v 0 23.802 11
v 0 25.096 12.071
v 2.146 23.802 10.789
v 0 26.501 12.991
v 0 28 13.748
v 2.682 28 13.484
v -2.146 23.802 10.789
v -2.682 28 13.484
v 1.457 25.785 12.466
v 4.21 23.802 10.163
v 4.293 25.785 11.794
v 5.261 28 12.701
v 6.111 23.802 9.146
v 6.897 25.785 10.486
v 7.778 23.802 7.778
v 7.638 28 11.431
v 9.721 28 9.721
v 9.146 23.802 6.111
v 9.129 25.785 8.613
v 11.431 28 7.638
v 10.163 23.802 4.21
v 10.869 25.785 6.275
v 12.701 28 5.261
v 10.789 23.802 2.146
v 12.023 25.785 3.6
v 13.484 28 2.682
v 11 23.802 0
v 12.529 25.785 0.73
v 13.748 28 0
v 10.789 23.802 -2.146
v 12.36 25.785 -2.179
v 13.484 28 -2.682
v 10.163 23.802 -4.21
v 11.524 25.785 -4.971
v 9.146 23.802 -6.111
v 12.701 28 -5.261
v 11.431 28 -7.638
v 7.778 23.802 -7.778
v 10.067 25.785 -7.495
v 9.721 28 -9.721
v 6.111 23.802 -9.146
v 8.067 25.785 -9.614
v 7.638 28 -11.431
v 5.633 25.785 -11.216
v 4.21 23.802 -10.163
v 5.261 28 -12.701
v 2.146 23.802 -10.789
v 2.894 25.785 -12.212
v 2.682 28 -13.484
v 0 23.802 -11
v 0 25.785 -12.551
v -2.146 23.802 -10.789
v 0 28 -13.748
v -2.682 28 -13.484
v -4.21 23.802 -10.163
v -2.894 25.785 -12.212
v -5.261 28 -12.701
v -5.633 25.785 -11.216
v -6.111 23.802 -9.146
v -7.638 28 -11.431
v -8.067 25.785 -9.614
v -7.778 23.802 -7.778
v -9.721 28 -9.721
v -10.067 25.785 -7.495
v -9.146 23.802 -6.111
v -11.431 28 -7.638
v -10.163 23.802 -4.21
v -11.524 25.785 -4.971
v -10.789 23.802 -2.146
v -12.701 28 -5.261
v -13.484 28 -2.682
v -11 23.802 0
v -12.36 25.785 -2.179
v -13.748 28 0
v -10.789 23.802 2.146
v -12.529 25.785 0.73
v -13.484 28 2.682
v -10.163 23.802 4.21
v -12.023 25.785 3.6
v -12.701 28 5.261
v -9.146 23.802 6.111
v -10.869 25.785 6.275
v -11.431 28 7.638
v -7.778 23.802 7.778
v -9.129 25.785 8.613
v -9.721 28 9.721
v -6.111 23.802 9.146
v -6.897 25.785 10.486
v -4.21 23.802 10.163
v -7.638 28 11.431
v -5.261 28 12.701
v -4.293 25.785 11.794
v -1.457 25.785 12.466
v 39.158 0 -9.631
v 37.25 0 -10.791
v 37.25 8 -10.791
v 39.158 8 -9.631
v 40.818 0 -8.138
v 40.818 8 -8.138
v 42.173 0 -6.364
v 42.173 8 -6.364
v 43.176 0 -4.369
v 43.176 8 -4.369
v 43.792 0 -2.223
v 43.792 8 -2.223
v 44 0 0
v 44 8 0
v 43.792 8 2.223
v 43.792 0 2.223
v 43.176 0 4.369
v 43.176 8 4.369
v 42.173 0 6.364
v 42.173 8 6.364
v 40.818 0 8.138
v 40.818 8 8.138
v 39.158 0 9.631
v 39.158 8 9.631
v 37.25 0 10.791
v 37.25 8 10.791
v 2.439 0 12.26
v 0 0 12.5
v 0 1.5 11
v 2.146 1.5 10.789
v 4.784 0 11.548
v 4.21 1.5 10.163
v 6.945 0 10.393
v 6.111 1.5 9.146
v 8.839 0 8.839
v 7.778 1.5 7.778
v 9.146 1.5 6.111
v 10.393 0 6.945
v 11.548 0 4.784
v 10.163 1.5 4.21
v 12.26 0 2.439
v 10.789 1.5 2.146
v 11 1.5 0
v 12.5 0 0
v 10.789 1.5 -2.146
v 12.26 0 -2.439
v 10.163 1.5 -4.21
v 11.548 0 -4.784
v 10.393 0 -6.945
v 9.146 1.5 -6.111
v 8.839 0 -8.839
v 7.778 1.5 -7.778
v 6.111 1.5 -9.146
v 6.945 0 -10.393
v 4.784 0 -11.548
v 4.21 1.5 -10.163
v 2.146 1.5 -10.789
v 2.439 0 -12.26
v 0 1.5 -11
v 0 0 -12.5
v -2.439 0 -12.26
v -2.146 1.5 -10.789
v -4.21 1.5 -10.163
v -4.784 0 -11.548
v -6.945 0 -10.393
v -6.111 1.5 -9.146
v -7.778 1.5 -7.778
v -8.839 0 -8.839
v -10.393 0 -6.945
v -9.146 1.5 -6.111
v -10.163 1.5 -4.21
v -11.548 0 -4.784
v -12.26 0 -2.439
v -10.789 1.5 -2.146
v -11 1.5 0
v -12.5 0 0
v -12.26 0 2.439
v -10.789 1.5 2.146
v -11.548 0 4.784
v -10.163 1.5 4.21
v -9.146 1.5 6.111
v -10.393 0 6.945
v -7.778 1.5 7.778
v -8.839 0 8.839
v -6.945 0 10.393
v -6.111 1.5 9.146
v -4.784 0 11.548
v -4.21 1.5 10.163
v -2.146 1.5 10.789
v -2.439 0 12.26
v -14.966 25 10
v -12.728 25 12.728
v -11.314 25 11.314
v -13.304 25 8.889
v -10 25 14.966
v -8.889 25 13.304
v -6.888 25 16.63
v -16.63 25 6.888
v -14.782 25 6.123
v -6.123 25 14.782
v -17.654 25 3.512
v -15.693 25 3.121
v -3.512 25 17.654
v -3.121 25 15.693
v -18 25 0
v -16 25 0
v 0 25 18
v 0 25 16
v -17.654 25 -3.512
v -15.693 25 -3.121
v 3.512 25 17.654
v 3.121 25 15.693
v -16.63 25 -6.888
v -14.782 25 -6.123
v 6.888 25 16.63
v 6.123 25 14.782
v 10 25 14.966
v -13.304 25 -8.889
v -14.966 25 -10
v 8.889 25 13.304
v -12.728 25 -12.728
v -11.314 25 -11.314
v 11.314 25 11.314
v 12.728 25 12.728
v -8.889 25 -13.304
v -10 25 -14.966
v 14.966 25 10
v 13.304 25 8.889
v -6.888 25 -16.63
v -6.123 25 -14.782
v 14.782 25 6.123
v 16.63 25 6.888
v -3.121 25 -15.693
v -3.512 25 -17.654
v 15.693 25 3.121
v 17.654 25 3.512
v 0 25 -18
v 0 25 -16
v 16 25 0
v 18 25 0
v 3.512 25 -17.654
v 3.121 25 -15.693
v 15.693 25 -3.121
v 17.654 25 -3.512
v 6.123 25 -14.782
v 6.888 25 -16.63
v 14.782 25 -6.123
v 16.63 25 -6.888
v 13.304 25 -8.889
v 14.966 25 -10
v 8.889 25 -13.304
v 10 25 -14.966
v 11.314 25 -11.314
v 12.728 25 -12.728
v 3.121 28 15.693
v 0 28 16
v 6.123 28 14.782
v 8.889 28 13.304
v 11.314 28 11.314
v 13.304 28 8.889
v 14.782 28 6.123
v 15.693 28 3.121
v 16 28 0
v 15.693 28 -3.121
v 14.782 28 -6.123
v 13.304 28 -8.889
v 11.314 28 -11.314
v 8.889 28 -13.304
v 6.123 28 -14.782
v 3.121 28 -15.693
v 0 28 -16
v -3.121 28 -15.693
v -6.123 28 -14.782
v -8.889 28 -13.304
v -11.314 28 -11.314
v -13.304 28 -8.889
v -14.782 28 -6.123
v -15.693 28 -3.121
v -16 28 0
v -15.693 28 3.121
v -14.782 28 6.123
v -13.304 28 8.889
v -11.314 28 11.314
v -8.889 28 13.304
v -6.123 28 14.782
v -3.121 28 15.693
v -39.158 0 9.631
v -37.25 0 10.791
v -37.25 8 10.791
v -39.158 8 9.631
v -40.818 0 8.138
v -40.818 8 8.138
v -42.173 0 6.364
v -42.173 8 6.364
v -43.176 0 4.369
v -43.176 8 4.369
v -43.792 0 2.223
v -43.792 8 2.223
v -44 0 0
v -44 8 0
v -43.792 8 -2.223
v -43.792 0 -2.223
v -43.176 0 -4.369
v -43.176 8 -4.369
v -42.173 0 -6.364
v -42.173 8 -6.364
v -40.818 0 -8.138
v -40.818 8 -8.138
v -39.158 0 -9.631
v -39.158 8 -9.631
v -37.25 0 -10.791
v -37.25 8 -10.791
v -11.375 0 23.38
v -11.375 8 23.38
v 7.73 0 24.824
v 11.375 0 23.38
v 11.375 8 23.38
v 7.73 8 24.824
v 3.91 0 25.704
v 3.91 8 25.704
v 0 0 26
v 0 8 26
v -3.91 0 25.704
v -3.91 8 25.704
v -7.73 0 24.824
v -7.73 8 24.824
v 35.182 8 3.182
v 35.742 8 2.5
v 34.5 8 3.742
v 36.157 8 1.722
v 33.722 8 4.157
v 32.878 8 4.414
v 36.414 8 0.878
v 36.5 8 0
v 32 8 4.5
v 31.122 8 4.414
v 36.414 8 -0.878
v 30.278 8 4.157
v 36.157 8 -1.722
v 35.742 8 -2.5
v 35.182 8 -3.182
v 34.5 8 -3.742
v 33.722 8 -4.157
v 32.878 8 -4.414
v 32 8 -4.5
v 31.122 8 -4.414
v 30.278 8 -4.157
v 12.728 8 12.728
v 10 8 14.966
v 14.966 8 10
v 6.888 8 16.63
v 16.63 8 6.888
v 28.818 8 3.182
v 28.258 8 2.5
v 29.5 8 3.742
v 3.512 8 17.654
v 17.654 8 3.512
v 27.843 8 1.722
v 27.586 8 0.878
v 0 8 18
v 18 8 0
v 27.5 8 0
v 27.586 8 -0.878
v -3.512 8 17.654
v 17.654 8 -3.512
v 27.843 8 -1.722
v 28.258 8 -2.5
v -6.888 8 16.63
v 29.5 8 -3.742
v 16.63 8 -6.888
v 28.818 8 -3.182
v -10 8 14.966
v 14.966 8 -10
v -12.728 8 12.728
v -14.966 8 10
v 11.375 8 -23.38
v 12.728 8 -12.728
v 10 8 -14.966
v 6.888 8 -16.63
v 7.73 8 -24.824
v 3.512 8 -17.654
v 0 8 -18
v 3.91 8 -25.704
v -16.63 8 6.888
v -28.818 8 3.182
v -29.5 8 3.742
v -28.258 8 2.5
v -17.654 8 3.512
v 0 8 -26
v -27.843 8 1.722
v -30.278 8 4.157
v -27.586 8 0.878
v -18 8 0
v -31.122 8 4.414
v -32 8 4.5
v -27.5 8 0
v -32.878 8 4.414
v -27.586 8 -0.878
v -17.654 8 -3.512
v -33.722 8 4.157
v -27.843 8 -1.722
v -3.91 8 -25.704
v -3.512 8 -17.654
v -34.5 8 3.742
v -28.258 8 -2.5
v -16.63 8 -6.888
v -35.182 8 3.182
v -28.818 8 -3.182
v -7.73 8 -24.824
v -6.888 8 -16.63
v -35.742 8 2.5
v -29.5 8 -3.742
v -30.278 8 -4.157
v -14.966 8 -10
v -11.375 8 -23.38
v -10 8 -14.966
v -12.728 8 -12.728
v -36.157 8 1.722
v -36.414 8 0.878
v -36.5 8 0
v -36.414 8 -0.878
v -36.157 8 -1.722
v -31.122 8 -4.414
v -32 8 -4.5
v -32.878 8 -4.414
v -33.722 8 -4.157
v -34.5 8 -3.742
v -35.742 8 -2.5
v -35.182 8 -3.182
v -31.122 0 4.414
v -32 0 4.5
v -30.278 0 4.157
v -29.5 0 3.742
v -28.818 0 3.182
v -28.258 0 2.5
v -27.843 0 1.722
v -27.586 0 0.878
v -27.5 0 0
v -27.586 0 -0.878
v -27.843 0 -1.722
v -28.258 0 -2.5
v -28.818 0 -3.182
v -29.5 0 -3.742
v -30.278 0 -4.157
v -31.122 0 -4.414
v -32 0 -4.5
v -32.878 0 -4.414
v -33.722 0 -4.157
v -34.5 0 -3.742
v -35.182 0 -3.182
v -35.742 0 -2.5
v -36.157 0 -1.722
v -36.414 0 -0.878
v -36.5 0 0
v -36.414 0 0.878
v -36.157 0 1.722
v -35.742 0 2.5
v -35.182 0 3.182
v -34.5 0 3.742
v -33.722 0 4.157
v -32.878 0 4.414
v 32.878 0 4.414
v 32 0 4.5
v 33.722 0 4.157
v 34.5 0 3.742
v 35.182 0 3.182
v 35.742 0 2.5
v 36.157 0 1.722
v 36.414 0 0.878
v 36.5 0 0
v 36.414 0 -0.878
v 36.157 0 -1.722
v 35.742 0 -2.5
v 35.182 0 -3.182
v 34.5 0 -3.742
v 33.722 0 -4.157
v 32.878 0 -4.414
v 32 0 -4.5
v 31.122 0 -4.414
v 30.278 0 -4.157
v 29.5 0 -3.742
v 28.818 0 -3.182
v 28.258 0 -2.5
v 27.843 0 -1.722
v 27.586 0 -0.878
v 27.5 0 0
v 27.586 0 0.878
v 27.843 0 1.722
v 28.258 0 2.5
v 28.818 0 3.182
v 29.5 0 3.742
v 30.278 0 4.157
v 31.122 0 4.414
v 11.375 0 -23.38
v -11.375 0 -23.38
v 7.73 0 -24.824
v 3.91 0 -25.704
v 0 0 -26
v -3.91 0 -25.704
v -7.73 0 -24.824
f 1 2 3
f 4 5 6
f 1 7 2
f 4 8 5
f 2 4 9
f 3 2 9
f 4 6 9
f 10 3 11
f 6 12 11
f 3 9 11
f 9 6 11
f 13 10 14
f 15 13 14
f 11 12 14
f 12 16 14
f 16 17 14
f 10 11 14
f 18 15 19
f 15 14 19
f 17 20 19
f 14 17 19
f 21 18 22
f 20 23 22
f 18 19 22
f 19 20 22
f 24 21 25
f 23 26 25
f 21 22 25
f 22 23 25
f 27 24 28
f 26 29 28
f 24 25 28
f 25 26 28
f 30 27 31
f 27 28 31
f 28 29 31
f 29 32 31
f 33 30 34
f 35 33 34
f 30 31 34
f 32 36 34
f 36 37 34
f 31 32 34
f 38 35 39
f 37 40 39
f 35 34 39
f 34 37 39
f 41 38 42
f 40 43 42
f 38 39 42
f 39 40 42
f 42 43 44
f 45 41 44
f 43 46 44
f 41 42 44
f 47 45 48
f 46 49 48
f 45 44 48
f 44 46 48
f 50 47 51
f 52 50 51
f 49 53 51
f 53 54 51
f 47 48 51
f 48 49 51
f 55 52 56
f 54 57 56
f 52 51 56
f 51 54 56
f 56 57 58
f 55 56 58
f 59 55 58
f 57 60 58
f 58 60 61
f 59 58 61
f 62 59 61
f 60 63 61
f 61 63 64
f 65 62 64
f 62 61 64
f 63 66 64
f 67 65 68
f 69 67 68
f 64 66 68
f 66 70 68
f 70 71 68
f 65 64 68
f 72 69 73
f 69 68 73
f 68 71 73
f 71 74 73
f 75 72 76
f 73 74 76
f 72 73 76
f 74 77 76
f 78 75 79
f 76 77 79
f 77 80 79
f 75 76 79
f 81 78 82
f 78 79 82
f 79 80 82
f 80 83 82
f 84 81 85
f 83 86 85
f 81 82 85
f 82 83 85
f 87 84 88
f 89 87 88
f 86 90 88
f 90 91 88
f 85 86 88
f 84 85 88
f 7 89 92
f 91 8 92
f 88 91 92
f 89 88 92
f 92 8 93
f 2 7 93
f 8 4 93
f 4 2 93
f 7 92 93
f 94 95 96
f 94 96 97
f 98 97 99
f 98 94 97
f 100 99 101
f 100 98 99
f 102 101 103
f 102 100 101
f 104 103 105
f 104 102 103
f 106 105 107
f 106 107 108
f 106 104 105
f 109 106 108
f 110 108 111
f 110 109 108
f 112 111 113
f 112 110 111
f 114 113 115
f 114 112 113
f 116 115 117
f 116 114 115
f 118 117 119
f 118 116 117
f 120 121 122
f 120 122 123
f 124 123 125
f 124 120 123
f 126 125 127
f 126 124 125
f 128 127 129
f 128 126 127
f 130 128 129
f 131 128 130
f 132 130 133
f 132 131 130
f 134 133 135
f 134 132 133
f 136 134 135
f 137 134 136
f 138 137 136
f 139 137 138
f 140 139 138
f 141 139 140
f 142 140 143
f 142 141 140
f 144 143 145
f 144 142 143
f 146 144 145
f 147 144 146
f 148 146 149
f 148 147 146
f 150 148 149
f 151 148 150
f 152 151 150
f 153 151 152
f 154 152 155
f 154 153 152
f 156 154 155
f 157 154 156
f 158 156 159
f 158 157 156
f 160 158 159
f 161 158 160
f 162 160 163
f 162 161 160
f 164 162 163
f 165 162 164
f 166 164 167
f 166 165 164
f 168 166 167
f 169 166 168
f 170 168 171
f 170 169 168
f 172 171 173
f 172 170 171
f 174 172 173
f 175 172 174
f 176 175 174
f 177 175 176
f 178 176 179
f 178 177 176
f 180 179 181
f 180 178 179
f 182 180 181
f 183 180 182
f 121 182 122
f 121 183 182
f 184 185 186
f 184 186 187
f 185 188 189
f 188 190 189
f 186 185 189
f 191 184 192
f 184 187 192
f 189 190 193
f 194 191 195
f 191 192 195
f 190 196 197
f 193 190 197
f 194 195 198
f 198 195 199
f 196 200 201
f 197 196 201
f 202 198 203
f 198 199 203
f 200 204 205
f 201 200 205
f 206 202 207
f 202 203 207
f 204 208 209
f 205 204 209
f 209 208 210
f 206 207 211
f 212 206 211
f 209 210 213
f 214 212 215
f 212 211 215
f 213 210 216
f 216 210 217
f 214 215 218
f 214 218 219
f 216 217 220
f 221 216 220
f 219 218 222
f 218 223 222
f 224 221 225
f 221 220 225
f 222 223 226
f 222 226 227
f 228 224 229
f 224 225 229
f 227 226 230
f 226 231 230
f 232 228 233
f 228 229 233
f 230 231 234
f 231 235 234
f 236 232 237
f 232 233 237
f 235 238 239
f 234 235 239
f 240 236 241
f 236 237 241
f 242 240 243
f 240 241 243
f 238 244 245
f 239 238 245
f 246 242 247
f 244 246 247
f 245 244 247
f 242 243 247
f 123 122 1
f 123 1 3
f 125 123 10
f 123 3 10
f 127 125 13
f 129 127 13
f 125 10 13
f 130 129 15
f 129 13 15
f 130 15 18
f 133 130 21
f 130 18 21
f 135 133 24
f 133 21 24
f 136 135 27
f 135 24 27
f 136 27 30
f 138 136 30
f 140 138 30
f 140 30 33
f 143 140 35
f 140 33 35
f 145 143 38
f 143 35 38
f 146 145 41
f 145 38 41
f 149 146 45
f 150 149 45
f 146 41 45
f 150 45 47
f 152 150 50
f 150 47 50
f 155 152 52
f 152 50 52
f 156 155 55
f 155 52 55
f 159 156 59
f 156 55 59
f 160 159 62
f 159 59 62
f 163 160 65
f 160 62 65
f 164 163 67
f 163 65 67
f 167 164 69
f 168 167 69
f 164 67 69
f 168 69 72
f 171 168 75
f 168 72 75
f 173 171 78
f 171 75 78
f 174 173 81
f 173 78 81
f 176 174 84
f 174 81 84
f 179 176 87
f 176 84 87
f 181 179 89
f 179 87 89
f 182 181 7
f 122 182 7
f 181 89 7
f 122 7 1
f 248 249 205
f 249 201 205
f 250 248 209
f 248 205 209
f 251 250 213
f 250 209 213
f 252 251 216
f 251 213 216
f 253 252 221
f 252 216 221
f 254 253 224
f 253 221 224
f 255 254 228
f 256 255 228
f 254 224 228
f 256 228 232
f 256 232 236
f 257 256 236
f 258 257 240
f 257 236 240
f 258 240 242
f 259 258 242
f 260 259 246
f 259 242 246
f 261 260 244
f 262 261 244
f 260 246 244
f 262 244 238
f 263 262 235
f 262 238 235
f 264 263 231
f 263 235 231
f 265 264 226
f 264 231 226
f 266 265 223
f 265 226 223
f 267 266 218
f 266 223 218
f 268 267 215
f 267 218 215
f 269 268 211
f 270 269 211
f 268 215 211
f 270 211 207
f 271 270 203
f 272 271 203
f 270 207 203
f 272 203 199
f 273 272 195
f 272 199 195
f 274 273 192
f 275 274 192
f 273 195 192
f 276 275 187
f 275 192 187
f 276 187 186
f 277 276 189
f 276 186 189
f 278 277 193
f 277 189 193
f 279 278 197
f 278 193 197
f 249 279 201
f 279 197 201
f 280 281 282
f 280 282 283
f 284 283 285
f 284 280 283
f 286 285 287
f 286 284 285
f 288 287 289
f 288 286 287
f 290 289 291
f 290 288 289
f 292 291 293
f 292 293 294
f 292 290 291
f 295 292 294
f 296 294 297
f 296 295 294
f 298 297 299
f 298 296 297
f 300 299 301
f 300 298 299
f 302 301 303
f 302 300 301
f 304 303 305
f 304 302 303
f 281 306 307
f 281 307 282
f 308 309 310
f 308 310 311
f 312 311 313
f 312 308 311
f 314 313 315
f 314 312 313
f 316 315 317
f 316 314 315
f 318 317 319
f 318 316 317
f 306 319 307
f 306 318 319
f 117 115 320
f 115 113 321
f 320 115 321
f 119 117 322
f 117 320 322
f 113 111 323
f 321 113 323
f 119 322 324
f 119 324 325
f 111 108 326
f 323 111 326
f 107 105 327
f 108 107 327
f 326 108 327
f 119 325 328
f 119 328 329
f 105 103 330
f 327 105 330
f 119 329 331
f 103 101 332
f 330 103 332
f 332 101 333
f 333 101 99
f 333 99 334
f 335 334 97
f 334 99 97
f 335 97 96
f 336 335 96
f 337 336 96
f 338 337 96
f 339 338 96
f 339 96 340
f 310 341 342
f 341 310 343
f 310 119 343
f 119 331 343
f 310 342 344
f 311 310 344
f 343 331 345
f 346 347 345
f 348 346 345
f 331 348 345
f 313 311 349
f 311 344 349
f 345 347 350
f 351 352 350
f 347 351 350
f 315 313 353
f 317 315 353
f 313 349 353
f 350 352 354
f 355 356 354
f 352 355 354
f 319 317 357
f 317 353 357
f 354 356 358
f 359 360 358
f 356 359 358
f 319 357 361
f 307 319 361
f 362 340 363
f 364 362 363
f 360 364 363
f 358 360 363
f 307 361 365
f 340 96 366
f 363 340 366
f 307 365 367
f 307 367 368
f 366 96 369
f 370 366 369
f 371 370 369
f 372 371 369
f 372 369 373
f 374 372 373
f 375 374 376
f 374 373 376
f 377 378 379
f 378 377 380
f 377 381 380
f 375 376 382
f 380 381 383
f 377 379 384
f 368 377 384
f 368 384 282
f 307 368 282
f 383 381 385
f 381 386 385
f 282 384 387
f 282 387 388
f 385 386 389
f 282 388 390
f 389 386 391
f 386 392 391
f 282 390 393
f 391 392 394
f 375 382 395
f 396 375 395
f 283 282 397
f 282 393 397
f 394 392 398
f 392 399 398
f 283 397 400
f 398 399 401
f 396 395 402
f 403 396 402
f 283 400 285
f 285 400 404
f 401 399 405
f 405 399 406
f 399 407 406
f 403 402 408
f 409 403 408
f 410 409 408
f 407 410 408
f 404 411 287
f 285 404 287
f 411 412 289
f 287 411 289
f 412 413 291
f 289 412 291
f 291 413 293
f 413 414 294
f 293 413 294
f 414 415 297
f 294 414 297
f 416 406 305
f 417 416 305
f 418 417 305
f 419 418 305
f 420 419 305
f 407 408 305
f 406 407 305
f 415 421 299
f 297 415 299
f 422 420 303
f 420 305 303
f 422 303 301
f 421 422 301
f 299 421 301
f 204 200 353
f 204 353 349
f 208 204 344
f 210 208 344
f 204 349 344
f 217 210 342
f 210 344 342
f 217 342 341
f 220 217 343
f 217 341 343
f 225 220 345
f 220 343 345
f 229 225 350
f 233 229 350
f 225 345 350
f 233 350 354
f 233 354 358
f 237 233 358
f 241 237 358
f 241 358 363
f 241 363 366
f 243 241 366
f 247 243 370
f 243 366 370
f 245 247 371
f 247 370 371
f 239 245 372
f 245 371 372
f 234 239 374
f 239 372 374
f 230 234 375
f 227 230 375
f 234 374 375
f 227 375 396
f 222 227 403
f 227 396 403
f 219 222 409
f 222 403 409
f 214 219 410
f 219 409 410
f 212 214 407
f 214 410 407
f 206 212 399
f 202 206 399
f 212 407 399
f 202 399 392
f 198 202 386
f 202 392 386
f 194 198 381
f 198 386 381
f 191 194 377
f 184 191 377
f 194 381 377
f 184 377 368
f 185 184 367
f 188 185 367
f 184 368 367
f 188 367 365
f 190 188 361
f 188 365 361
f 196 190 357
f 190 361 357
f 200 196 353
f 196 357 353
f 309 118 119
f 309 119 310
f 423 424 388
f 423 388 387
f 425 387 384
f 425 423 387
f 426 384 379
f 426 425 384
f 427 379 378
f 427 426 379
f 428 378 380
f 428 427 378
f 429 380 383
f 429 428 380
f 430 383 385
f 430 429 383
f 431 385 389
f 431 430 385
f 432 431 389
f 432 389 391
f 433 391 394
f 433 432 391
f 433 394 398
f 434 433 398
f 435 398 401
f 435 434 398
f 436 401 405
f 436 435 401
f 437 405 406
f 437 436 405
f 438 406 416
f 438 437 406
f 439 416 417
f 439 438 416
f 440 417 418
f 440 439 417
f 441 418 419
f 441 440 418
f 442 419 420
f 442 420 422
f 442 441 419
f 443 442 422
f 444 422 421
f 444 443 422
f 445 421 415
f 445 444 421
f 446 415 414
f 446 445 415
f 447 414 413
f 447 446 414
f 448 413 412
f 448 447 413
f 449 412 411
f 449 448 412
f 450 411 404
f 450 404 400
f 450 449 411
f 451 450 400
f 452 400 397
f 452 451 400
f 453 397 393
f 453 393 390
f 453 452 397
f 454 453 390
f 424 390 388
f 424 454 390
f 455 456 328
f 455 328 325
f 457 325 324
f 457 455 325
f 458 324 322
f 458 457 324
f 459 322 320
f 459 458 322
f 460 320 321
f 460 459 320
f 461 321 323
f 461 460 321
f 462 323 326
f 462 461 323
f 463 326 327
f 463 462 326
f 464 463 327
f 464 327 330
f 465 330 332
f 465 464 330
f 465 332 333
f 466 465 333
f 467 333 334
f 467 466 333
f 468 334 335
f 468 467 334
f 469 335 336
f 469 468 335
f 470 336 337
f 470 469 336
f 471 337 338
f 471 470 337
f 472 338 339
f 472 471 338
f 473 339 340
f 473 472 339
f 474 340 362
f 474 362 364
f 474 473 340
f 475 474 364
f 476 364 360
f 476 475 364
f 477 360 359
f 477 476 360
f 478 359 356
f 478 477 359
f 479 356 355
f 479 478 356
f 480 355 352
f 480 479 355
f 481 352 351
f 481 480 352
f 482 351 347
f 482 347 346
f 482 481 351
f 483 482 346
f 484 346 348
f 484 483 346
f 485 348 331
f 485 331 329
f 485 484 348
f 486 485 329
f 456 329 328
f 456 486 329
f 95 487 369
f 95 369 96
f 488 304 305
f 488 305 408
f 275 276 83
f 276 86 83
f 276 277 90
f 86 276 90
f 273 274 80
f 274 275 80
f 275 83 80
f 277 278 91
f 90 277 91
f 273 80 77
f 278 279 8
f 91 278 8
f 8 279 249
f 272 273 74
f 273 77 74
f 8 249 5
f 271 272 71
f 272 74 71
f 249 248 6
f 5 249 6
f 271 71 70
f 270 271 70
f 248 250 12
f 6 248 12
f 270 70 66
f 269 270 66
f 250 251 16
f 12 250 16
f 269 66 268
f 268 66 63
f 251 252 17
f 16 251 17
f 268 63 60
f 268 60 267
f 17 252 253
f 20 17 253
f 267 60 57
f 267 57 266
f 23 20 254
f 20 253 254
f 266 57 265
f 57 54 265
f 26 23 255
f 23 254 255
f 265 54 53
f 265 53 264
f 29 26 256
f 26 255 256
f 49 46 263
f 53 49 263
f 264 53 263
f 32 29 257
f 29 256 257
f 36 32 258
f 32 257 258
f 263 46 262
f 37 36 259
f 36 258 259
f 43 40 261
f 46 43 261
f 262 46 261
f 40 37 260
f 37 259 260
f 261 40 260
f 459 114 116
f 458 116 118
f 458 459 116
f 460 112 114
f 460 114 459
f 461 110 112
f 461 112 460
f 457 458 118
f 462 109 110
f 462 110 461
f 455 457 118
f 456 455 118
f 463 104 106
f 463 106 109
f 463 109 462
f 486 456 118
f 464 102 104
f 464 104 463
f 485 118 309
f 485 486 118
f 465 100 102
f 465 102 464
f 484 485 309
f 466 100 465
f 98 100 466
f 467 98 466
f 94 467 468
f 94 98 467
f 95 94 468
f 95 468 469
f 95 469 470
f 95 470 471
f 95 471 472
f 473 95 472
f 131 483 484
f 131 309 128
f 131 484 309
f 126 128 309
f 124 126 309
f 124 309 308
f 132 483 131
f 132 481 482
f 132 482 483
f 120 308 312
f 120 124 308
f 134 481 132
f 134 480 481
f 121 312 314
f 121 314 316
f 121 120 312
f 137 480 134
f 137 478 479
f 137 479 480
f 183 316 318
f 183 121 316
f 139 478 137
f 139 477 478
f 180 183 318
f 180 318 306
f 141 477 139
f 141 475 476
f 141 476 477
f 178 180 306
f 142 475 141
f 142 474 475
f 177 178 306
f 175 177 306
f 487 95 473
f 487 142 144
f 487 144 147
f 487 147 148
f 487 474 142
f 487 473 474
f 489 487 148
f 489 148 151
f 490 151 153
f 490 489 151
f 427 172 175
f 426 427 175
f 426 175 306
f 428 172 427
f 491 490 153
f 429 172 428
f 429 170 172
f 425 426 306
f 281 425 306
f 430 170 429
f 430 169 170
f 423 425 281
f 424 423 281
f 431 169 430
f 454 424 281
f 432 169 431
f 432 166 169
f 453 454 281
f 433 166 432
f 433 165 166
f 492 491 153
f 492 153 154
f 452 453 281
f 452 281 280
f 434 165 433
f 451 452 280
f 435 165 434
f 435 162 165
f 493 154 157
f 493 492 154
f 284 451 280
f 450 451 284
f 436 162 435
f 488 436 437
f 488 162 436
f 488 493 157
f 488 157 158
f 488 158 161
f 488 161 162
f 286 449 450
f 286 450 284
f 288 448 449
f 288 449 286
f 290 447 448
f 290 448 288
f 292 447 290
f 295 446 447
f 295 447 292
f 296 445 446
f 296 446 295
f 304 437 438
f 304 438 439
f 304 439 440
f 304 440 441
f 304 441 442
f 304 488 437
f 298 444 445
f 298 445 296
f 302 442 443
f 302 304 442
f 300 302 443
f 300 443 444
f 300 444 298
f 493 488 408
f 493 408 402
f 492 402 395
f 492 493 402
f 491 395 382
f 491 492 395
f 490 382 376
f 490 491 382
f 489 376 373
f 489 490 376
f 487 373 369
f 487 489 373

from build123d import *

# Parameters (mm, degrees)
SKETCH_1_R      = 4.5
SKETCH_1_R_2    = 11
EXTRUDE_1_DEPTH = 8
CHAMFER_1_SIZE  = 1.5


with BuildPart() as part:
    # 草图1 → 凸台-拉伸1 (new body)
    with BuildSketch(Plane(origin=(0, 0, 0), x_dir=(1, 0, 0), z_dir=(0, 1, 0))):
        with BuildLine():
            Line((-37.25, 10.790620927), (-11.375, 23.379678676))
            ThreePointArc((-11.375, 23.379678676), (0, 26), (11.375, 23.379678676))
            Line((11.375, 23.379678676), (37.25, 10.790620927))
            ThreePointArc((37.25, 10.790620927), (44, 0), (37.25, -10.790620927))
            Line((37.25, -10.790620927), (11.375, -23.379678676))
            ThreePointArc((11.375, -23.379678676), (0, -26), (-11.375, -23.379678676))
            Line((-11.375, -23.379678676), (-37.25, -10.790620927))
            ThreePointArc((-37.25, -10.790620927), (-44, 0), (-37.25, 10.790620927))
        make_face()
        with Locations(Location((-32, 0, 0), (0, 0, 270))):
            Circle(SKETCH_1_R, mode=Mode.SUBTRACT)
        with Locations(Location((32, 0, 0), (0, 0, 270))):
            Circle(SKETCH_1_R, mode=Mode.SUBTRACT)
        with Locations(Location((0, 0, 0), (0, 0, 270))):
            Circle(SKETCH_1_R_2, mode=Mode.SUBTRACT)
    extrude(amount=EXTRUDE_1_DEPTH)

    # 草图2 → 旋转1 (revolve)
    with BuildSketch(Plane(origin=(0, 0, 0), x_dir=(0, 0, -1), z_dir=(1, 0, 0))):
        with BuildLine():
            Line((-18, 8), (-11, 8))
            Line((-11, 8), (-11, 23.801960973))
            ThreePointArc((-11, 23.801960973), (-12.550632728, 25.7852804), (-13.747727085, 28))
            Line((-13.747727085, 28), (-16, 28))
            Line((-16, 28), (-16, 25))
            Line((-16, 25), (-18, 25))
            Line((-18, 25), (-18, 8))
        make_face()
    revolve(axis=Axis((0, 0, 0), (0, 1, 0)))

    # 倒角1
    chamfer_1_edges = [part.edges().sort_by_distance(p)[0] for p in [
        (0, 0, -11),
    ]]
    chamfer(chamfer_1_edges, length=CHAMFER_1_SIZE)


solid = part.part
